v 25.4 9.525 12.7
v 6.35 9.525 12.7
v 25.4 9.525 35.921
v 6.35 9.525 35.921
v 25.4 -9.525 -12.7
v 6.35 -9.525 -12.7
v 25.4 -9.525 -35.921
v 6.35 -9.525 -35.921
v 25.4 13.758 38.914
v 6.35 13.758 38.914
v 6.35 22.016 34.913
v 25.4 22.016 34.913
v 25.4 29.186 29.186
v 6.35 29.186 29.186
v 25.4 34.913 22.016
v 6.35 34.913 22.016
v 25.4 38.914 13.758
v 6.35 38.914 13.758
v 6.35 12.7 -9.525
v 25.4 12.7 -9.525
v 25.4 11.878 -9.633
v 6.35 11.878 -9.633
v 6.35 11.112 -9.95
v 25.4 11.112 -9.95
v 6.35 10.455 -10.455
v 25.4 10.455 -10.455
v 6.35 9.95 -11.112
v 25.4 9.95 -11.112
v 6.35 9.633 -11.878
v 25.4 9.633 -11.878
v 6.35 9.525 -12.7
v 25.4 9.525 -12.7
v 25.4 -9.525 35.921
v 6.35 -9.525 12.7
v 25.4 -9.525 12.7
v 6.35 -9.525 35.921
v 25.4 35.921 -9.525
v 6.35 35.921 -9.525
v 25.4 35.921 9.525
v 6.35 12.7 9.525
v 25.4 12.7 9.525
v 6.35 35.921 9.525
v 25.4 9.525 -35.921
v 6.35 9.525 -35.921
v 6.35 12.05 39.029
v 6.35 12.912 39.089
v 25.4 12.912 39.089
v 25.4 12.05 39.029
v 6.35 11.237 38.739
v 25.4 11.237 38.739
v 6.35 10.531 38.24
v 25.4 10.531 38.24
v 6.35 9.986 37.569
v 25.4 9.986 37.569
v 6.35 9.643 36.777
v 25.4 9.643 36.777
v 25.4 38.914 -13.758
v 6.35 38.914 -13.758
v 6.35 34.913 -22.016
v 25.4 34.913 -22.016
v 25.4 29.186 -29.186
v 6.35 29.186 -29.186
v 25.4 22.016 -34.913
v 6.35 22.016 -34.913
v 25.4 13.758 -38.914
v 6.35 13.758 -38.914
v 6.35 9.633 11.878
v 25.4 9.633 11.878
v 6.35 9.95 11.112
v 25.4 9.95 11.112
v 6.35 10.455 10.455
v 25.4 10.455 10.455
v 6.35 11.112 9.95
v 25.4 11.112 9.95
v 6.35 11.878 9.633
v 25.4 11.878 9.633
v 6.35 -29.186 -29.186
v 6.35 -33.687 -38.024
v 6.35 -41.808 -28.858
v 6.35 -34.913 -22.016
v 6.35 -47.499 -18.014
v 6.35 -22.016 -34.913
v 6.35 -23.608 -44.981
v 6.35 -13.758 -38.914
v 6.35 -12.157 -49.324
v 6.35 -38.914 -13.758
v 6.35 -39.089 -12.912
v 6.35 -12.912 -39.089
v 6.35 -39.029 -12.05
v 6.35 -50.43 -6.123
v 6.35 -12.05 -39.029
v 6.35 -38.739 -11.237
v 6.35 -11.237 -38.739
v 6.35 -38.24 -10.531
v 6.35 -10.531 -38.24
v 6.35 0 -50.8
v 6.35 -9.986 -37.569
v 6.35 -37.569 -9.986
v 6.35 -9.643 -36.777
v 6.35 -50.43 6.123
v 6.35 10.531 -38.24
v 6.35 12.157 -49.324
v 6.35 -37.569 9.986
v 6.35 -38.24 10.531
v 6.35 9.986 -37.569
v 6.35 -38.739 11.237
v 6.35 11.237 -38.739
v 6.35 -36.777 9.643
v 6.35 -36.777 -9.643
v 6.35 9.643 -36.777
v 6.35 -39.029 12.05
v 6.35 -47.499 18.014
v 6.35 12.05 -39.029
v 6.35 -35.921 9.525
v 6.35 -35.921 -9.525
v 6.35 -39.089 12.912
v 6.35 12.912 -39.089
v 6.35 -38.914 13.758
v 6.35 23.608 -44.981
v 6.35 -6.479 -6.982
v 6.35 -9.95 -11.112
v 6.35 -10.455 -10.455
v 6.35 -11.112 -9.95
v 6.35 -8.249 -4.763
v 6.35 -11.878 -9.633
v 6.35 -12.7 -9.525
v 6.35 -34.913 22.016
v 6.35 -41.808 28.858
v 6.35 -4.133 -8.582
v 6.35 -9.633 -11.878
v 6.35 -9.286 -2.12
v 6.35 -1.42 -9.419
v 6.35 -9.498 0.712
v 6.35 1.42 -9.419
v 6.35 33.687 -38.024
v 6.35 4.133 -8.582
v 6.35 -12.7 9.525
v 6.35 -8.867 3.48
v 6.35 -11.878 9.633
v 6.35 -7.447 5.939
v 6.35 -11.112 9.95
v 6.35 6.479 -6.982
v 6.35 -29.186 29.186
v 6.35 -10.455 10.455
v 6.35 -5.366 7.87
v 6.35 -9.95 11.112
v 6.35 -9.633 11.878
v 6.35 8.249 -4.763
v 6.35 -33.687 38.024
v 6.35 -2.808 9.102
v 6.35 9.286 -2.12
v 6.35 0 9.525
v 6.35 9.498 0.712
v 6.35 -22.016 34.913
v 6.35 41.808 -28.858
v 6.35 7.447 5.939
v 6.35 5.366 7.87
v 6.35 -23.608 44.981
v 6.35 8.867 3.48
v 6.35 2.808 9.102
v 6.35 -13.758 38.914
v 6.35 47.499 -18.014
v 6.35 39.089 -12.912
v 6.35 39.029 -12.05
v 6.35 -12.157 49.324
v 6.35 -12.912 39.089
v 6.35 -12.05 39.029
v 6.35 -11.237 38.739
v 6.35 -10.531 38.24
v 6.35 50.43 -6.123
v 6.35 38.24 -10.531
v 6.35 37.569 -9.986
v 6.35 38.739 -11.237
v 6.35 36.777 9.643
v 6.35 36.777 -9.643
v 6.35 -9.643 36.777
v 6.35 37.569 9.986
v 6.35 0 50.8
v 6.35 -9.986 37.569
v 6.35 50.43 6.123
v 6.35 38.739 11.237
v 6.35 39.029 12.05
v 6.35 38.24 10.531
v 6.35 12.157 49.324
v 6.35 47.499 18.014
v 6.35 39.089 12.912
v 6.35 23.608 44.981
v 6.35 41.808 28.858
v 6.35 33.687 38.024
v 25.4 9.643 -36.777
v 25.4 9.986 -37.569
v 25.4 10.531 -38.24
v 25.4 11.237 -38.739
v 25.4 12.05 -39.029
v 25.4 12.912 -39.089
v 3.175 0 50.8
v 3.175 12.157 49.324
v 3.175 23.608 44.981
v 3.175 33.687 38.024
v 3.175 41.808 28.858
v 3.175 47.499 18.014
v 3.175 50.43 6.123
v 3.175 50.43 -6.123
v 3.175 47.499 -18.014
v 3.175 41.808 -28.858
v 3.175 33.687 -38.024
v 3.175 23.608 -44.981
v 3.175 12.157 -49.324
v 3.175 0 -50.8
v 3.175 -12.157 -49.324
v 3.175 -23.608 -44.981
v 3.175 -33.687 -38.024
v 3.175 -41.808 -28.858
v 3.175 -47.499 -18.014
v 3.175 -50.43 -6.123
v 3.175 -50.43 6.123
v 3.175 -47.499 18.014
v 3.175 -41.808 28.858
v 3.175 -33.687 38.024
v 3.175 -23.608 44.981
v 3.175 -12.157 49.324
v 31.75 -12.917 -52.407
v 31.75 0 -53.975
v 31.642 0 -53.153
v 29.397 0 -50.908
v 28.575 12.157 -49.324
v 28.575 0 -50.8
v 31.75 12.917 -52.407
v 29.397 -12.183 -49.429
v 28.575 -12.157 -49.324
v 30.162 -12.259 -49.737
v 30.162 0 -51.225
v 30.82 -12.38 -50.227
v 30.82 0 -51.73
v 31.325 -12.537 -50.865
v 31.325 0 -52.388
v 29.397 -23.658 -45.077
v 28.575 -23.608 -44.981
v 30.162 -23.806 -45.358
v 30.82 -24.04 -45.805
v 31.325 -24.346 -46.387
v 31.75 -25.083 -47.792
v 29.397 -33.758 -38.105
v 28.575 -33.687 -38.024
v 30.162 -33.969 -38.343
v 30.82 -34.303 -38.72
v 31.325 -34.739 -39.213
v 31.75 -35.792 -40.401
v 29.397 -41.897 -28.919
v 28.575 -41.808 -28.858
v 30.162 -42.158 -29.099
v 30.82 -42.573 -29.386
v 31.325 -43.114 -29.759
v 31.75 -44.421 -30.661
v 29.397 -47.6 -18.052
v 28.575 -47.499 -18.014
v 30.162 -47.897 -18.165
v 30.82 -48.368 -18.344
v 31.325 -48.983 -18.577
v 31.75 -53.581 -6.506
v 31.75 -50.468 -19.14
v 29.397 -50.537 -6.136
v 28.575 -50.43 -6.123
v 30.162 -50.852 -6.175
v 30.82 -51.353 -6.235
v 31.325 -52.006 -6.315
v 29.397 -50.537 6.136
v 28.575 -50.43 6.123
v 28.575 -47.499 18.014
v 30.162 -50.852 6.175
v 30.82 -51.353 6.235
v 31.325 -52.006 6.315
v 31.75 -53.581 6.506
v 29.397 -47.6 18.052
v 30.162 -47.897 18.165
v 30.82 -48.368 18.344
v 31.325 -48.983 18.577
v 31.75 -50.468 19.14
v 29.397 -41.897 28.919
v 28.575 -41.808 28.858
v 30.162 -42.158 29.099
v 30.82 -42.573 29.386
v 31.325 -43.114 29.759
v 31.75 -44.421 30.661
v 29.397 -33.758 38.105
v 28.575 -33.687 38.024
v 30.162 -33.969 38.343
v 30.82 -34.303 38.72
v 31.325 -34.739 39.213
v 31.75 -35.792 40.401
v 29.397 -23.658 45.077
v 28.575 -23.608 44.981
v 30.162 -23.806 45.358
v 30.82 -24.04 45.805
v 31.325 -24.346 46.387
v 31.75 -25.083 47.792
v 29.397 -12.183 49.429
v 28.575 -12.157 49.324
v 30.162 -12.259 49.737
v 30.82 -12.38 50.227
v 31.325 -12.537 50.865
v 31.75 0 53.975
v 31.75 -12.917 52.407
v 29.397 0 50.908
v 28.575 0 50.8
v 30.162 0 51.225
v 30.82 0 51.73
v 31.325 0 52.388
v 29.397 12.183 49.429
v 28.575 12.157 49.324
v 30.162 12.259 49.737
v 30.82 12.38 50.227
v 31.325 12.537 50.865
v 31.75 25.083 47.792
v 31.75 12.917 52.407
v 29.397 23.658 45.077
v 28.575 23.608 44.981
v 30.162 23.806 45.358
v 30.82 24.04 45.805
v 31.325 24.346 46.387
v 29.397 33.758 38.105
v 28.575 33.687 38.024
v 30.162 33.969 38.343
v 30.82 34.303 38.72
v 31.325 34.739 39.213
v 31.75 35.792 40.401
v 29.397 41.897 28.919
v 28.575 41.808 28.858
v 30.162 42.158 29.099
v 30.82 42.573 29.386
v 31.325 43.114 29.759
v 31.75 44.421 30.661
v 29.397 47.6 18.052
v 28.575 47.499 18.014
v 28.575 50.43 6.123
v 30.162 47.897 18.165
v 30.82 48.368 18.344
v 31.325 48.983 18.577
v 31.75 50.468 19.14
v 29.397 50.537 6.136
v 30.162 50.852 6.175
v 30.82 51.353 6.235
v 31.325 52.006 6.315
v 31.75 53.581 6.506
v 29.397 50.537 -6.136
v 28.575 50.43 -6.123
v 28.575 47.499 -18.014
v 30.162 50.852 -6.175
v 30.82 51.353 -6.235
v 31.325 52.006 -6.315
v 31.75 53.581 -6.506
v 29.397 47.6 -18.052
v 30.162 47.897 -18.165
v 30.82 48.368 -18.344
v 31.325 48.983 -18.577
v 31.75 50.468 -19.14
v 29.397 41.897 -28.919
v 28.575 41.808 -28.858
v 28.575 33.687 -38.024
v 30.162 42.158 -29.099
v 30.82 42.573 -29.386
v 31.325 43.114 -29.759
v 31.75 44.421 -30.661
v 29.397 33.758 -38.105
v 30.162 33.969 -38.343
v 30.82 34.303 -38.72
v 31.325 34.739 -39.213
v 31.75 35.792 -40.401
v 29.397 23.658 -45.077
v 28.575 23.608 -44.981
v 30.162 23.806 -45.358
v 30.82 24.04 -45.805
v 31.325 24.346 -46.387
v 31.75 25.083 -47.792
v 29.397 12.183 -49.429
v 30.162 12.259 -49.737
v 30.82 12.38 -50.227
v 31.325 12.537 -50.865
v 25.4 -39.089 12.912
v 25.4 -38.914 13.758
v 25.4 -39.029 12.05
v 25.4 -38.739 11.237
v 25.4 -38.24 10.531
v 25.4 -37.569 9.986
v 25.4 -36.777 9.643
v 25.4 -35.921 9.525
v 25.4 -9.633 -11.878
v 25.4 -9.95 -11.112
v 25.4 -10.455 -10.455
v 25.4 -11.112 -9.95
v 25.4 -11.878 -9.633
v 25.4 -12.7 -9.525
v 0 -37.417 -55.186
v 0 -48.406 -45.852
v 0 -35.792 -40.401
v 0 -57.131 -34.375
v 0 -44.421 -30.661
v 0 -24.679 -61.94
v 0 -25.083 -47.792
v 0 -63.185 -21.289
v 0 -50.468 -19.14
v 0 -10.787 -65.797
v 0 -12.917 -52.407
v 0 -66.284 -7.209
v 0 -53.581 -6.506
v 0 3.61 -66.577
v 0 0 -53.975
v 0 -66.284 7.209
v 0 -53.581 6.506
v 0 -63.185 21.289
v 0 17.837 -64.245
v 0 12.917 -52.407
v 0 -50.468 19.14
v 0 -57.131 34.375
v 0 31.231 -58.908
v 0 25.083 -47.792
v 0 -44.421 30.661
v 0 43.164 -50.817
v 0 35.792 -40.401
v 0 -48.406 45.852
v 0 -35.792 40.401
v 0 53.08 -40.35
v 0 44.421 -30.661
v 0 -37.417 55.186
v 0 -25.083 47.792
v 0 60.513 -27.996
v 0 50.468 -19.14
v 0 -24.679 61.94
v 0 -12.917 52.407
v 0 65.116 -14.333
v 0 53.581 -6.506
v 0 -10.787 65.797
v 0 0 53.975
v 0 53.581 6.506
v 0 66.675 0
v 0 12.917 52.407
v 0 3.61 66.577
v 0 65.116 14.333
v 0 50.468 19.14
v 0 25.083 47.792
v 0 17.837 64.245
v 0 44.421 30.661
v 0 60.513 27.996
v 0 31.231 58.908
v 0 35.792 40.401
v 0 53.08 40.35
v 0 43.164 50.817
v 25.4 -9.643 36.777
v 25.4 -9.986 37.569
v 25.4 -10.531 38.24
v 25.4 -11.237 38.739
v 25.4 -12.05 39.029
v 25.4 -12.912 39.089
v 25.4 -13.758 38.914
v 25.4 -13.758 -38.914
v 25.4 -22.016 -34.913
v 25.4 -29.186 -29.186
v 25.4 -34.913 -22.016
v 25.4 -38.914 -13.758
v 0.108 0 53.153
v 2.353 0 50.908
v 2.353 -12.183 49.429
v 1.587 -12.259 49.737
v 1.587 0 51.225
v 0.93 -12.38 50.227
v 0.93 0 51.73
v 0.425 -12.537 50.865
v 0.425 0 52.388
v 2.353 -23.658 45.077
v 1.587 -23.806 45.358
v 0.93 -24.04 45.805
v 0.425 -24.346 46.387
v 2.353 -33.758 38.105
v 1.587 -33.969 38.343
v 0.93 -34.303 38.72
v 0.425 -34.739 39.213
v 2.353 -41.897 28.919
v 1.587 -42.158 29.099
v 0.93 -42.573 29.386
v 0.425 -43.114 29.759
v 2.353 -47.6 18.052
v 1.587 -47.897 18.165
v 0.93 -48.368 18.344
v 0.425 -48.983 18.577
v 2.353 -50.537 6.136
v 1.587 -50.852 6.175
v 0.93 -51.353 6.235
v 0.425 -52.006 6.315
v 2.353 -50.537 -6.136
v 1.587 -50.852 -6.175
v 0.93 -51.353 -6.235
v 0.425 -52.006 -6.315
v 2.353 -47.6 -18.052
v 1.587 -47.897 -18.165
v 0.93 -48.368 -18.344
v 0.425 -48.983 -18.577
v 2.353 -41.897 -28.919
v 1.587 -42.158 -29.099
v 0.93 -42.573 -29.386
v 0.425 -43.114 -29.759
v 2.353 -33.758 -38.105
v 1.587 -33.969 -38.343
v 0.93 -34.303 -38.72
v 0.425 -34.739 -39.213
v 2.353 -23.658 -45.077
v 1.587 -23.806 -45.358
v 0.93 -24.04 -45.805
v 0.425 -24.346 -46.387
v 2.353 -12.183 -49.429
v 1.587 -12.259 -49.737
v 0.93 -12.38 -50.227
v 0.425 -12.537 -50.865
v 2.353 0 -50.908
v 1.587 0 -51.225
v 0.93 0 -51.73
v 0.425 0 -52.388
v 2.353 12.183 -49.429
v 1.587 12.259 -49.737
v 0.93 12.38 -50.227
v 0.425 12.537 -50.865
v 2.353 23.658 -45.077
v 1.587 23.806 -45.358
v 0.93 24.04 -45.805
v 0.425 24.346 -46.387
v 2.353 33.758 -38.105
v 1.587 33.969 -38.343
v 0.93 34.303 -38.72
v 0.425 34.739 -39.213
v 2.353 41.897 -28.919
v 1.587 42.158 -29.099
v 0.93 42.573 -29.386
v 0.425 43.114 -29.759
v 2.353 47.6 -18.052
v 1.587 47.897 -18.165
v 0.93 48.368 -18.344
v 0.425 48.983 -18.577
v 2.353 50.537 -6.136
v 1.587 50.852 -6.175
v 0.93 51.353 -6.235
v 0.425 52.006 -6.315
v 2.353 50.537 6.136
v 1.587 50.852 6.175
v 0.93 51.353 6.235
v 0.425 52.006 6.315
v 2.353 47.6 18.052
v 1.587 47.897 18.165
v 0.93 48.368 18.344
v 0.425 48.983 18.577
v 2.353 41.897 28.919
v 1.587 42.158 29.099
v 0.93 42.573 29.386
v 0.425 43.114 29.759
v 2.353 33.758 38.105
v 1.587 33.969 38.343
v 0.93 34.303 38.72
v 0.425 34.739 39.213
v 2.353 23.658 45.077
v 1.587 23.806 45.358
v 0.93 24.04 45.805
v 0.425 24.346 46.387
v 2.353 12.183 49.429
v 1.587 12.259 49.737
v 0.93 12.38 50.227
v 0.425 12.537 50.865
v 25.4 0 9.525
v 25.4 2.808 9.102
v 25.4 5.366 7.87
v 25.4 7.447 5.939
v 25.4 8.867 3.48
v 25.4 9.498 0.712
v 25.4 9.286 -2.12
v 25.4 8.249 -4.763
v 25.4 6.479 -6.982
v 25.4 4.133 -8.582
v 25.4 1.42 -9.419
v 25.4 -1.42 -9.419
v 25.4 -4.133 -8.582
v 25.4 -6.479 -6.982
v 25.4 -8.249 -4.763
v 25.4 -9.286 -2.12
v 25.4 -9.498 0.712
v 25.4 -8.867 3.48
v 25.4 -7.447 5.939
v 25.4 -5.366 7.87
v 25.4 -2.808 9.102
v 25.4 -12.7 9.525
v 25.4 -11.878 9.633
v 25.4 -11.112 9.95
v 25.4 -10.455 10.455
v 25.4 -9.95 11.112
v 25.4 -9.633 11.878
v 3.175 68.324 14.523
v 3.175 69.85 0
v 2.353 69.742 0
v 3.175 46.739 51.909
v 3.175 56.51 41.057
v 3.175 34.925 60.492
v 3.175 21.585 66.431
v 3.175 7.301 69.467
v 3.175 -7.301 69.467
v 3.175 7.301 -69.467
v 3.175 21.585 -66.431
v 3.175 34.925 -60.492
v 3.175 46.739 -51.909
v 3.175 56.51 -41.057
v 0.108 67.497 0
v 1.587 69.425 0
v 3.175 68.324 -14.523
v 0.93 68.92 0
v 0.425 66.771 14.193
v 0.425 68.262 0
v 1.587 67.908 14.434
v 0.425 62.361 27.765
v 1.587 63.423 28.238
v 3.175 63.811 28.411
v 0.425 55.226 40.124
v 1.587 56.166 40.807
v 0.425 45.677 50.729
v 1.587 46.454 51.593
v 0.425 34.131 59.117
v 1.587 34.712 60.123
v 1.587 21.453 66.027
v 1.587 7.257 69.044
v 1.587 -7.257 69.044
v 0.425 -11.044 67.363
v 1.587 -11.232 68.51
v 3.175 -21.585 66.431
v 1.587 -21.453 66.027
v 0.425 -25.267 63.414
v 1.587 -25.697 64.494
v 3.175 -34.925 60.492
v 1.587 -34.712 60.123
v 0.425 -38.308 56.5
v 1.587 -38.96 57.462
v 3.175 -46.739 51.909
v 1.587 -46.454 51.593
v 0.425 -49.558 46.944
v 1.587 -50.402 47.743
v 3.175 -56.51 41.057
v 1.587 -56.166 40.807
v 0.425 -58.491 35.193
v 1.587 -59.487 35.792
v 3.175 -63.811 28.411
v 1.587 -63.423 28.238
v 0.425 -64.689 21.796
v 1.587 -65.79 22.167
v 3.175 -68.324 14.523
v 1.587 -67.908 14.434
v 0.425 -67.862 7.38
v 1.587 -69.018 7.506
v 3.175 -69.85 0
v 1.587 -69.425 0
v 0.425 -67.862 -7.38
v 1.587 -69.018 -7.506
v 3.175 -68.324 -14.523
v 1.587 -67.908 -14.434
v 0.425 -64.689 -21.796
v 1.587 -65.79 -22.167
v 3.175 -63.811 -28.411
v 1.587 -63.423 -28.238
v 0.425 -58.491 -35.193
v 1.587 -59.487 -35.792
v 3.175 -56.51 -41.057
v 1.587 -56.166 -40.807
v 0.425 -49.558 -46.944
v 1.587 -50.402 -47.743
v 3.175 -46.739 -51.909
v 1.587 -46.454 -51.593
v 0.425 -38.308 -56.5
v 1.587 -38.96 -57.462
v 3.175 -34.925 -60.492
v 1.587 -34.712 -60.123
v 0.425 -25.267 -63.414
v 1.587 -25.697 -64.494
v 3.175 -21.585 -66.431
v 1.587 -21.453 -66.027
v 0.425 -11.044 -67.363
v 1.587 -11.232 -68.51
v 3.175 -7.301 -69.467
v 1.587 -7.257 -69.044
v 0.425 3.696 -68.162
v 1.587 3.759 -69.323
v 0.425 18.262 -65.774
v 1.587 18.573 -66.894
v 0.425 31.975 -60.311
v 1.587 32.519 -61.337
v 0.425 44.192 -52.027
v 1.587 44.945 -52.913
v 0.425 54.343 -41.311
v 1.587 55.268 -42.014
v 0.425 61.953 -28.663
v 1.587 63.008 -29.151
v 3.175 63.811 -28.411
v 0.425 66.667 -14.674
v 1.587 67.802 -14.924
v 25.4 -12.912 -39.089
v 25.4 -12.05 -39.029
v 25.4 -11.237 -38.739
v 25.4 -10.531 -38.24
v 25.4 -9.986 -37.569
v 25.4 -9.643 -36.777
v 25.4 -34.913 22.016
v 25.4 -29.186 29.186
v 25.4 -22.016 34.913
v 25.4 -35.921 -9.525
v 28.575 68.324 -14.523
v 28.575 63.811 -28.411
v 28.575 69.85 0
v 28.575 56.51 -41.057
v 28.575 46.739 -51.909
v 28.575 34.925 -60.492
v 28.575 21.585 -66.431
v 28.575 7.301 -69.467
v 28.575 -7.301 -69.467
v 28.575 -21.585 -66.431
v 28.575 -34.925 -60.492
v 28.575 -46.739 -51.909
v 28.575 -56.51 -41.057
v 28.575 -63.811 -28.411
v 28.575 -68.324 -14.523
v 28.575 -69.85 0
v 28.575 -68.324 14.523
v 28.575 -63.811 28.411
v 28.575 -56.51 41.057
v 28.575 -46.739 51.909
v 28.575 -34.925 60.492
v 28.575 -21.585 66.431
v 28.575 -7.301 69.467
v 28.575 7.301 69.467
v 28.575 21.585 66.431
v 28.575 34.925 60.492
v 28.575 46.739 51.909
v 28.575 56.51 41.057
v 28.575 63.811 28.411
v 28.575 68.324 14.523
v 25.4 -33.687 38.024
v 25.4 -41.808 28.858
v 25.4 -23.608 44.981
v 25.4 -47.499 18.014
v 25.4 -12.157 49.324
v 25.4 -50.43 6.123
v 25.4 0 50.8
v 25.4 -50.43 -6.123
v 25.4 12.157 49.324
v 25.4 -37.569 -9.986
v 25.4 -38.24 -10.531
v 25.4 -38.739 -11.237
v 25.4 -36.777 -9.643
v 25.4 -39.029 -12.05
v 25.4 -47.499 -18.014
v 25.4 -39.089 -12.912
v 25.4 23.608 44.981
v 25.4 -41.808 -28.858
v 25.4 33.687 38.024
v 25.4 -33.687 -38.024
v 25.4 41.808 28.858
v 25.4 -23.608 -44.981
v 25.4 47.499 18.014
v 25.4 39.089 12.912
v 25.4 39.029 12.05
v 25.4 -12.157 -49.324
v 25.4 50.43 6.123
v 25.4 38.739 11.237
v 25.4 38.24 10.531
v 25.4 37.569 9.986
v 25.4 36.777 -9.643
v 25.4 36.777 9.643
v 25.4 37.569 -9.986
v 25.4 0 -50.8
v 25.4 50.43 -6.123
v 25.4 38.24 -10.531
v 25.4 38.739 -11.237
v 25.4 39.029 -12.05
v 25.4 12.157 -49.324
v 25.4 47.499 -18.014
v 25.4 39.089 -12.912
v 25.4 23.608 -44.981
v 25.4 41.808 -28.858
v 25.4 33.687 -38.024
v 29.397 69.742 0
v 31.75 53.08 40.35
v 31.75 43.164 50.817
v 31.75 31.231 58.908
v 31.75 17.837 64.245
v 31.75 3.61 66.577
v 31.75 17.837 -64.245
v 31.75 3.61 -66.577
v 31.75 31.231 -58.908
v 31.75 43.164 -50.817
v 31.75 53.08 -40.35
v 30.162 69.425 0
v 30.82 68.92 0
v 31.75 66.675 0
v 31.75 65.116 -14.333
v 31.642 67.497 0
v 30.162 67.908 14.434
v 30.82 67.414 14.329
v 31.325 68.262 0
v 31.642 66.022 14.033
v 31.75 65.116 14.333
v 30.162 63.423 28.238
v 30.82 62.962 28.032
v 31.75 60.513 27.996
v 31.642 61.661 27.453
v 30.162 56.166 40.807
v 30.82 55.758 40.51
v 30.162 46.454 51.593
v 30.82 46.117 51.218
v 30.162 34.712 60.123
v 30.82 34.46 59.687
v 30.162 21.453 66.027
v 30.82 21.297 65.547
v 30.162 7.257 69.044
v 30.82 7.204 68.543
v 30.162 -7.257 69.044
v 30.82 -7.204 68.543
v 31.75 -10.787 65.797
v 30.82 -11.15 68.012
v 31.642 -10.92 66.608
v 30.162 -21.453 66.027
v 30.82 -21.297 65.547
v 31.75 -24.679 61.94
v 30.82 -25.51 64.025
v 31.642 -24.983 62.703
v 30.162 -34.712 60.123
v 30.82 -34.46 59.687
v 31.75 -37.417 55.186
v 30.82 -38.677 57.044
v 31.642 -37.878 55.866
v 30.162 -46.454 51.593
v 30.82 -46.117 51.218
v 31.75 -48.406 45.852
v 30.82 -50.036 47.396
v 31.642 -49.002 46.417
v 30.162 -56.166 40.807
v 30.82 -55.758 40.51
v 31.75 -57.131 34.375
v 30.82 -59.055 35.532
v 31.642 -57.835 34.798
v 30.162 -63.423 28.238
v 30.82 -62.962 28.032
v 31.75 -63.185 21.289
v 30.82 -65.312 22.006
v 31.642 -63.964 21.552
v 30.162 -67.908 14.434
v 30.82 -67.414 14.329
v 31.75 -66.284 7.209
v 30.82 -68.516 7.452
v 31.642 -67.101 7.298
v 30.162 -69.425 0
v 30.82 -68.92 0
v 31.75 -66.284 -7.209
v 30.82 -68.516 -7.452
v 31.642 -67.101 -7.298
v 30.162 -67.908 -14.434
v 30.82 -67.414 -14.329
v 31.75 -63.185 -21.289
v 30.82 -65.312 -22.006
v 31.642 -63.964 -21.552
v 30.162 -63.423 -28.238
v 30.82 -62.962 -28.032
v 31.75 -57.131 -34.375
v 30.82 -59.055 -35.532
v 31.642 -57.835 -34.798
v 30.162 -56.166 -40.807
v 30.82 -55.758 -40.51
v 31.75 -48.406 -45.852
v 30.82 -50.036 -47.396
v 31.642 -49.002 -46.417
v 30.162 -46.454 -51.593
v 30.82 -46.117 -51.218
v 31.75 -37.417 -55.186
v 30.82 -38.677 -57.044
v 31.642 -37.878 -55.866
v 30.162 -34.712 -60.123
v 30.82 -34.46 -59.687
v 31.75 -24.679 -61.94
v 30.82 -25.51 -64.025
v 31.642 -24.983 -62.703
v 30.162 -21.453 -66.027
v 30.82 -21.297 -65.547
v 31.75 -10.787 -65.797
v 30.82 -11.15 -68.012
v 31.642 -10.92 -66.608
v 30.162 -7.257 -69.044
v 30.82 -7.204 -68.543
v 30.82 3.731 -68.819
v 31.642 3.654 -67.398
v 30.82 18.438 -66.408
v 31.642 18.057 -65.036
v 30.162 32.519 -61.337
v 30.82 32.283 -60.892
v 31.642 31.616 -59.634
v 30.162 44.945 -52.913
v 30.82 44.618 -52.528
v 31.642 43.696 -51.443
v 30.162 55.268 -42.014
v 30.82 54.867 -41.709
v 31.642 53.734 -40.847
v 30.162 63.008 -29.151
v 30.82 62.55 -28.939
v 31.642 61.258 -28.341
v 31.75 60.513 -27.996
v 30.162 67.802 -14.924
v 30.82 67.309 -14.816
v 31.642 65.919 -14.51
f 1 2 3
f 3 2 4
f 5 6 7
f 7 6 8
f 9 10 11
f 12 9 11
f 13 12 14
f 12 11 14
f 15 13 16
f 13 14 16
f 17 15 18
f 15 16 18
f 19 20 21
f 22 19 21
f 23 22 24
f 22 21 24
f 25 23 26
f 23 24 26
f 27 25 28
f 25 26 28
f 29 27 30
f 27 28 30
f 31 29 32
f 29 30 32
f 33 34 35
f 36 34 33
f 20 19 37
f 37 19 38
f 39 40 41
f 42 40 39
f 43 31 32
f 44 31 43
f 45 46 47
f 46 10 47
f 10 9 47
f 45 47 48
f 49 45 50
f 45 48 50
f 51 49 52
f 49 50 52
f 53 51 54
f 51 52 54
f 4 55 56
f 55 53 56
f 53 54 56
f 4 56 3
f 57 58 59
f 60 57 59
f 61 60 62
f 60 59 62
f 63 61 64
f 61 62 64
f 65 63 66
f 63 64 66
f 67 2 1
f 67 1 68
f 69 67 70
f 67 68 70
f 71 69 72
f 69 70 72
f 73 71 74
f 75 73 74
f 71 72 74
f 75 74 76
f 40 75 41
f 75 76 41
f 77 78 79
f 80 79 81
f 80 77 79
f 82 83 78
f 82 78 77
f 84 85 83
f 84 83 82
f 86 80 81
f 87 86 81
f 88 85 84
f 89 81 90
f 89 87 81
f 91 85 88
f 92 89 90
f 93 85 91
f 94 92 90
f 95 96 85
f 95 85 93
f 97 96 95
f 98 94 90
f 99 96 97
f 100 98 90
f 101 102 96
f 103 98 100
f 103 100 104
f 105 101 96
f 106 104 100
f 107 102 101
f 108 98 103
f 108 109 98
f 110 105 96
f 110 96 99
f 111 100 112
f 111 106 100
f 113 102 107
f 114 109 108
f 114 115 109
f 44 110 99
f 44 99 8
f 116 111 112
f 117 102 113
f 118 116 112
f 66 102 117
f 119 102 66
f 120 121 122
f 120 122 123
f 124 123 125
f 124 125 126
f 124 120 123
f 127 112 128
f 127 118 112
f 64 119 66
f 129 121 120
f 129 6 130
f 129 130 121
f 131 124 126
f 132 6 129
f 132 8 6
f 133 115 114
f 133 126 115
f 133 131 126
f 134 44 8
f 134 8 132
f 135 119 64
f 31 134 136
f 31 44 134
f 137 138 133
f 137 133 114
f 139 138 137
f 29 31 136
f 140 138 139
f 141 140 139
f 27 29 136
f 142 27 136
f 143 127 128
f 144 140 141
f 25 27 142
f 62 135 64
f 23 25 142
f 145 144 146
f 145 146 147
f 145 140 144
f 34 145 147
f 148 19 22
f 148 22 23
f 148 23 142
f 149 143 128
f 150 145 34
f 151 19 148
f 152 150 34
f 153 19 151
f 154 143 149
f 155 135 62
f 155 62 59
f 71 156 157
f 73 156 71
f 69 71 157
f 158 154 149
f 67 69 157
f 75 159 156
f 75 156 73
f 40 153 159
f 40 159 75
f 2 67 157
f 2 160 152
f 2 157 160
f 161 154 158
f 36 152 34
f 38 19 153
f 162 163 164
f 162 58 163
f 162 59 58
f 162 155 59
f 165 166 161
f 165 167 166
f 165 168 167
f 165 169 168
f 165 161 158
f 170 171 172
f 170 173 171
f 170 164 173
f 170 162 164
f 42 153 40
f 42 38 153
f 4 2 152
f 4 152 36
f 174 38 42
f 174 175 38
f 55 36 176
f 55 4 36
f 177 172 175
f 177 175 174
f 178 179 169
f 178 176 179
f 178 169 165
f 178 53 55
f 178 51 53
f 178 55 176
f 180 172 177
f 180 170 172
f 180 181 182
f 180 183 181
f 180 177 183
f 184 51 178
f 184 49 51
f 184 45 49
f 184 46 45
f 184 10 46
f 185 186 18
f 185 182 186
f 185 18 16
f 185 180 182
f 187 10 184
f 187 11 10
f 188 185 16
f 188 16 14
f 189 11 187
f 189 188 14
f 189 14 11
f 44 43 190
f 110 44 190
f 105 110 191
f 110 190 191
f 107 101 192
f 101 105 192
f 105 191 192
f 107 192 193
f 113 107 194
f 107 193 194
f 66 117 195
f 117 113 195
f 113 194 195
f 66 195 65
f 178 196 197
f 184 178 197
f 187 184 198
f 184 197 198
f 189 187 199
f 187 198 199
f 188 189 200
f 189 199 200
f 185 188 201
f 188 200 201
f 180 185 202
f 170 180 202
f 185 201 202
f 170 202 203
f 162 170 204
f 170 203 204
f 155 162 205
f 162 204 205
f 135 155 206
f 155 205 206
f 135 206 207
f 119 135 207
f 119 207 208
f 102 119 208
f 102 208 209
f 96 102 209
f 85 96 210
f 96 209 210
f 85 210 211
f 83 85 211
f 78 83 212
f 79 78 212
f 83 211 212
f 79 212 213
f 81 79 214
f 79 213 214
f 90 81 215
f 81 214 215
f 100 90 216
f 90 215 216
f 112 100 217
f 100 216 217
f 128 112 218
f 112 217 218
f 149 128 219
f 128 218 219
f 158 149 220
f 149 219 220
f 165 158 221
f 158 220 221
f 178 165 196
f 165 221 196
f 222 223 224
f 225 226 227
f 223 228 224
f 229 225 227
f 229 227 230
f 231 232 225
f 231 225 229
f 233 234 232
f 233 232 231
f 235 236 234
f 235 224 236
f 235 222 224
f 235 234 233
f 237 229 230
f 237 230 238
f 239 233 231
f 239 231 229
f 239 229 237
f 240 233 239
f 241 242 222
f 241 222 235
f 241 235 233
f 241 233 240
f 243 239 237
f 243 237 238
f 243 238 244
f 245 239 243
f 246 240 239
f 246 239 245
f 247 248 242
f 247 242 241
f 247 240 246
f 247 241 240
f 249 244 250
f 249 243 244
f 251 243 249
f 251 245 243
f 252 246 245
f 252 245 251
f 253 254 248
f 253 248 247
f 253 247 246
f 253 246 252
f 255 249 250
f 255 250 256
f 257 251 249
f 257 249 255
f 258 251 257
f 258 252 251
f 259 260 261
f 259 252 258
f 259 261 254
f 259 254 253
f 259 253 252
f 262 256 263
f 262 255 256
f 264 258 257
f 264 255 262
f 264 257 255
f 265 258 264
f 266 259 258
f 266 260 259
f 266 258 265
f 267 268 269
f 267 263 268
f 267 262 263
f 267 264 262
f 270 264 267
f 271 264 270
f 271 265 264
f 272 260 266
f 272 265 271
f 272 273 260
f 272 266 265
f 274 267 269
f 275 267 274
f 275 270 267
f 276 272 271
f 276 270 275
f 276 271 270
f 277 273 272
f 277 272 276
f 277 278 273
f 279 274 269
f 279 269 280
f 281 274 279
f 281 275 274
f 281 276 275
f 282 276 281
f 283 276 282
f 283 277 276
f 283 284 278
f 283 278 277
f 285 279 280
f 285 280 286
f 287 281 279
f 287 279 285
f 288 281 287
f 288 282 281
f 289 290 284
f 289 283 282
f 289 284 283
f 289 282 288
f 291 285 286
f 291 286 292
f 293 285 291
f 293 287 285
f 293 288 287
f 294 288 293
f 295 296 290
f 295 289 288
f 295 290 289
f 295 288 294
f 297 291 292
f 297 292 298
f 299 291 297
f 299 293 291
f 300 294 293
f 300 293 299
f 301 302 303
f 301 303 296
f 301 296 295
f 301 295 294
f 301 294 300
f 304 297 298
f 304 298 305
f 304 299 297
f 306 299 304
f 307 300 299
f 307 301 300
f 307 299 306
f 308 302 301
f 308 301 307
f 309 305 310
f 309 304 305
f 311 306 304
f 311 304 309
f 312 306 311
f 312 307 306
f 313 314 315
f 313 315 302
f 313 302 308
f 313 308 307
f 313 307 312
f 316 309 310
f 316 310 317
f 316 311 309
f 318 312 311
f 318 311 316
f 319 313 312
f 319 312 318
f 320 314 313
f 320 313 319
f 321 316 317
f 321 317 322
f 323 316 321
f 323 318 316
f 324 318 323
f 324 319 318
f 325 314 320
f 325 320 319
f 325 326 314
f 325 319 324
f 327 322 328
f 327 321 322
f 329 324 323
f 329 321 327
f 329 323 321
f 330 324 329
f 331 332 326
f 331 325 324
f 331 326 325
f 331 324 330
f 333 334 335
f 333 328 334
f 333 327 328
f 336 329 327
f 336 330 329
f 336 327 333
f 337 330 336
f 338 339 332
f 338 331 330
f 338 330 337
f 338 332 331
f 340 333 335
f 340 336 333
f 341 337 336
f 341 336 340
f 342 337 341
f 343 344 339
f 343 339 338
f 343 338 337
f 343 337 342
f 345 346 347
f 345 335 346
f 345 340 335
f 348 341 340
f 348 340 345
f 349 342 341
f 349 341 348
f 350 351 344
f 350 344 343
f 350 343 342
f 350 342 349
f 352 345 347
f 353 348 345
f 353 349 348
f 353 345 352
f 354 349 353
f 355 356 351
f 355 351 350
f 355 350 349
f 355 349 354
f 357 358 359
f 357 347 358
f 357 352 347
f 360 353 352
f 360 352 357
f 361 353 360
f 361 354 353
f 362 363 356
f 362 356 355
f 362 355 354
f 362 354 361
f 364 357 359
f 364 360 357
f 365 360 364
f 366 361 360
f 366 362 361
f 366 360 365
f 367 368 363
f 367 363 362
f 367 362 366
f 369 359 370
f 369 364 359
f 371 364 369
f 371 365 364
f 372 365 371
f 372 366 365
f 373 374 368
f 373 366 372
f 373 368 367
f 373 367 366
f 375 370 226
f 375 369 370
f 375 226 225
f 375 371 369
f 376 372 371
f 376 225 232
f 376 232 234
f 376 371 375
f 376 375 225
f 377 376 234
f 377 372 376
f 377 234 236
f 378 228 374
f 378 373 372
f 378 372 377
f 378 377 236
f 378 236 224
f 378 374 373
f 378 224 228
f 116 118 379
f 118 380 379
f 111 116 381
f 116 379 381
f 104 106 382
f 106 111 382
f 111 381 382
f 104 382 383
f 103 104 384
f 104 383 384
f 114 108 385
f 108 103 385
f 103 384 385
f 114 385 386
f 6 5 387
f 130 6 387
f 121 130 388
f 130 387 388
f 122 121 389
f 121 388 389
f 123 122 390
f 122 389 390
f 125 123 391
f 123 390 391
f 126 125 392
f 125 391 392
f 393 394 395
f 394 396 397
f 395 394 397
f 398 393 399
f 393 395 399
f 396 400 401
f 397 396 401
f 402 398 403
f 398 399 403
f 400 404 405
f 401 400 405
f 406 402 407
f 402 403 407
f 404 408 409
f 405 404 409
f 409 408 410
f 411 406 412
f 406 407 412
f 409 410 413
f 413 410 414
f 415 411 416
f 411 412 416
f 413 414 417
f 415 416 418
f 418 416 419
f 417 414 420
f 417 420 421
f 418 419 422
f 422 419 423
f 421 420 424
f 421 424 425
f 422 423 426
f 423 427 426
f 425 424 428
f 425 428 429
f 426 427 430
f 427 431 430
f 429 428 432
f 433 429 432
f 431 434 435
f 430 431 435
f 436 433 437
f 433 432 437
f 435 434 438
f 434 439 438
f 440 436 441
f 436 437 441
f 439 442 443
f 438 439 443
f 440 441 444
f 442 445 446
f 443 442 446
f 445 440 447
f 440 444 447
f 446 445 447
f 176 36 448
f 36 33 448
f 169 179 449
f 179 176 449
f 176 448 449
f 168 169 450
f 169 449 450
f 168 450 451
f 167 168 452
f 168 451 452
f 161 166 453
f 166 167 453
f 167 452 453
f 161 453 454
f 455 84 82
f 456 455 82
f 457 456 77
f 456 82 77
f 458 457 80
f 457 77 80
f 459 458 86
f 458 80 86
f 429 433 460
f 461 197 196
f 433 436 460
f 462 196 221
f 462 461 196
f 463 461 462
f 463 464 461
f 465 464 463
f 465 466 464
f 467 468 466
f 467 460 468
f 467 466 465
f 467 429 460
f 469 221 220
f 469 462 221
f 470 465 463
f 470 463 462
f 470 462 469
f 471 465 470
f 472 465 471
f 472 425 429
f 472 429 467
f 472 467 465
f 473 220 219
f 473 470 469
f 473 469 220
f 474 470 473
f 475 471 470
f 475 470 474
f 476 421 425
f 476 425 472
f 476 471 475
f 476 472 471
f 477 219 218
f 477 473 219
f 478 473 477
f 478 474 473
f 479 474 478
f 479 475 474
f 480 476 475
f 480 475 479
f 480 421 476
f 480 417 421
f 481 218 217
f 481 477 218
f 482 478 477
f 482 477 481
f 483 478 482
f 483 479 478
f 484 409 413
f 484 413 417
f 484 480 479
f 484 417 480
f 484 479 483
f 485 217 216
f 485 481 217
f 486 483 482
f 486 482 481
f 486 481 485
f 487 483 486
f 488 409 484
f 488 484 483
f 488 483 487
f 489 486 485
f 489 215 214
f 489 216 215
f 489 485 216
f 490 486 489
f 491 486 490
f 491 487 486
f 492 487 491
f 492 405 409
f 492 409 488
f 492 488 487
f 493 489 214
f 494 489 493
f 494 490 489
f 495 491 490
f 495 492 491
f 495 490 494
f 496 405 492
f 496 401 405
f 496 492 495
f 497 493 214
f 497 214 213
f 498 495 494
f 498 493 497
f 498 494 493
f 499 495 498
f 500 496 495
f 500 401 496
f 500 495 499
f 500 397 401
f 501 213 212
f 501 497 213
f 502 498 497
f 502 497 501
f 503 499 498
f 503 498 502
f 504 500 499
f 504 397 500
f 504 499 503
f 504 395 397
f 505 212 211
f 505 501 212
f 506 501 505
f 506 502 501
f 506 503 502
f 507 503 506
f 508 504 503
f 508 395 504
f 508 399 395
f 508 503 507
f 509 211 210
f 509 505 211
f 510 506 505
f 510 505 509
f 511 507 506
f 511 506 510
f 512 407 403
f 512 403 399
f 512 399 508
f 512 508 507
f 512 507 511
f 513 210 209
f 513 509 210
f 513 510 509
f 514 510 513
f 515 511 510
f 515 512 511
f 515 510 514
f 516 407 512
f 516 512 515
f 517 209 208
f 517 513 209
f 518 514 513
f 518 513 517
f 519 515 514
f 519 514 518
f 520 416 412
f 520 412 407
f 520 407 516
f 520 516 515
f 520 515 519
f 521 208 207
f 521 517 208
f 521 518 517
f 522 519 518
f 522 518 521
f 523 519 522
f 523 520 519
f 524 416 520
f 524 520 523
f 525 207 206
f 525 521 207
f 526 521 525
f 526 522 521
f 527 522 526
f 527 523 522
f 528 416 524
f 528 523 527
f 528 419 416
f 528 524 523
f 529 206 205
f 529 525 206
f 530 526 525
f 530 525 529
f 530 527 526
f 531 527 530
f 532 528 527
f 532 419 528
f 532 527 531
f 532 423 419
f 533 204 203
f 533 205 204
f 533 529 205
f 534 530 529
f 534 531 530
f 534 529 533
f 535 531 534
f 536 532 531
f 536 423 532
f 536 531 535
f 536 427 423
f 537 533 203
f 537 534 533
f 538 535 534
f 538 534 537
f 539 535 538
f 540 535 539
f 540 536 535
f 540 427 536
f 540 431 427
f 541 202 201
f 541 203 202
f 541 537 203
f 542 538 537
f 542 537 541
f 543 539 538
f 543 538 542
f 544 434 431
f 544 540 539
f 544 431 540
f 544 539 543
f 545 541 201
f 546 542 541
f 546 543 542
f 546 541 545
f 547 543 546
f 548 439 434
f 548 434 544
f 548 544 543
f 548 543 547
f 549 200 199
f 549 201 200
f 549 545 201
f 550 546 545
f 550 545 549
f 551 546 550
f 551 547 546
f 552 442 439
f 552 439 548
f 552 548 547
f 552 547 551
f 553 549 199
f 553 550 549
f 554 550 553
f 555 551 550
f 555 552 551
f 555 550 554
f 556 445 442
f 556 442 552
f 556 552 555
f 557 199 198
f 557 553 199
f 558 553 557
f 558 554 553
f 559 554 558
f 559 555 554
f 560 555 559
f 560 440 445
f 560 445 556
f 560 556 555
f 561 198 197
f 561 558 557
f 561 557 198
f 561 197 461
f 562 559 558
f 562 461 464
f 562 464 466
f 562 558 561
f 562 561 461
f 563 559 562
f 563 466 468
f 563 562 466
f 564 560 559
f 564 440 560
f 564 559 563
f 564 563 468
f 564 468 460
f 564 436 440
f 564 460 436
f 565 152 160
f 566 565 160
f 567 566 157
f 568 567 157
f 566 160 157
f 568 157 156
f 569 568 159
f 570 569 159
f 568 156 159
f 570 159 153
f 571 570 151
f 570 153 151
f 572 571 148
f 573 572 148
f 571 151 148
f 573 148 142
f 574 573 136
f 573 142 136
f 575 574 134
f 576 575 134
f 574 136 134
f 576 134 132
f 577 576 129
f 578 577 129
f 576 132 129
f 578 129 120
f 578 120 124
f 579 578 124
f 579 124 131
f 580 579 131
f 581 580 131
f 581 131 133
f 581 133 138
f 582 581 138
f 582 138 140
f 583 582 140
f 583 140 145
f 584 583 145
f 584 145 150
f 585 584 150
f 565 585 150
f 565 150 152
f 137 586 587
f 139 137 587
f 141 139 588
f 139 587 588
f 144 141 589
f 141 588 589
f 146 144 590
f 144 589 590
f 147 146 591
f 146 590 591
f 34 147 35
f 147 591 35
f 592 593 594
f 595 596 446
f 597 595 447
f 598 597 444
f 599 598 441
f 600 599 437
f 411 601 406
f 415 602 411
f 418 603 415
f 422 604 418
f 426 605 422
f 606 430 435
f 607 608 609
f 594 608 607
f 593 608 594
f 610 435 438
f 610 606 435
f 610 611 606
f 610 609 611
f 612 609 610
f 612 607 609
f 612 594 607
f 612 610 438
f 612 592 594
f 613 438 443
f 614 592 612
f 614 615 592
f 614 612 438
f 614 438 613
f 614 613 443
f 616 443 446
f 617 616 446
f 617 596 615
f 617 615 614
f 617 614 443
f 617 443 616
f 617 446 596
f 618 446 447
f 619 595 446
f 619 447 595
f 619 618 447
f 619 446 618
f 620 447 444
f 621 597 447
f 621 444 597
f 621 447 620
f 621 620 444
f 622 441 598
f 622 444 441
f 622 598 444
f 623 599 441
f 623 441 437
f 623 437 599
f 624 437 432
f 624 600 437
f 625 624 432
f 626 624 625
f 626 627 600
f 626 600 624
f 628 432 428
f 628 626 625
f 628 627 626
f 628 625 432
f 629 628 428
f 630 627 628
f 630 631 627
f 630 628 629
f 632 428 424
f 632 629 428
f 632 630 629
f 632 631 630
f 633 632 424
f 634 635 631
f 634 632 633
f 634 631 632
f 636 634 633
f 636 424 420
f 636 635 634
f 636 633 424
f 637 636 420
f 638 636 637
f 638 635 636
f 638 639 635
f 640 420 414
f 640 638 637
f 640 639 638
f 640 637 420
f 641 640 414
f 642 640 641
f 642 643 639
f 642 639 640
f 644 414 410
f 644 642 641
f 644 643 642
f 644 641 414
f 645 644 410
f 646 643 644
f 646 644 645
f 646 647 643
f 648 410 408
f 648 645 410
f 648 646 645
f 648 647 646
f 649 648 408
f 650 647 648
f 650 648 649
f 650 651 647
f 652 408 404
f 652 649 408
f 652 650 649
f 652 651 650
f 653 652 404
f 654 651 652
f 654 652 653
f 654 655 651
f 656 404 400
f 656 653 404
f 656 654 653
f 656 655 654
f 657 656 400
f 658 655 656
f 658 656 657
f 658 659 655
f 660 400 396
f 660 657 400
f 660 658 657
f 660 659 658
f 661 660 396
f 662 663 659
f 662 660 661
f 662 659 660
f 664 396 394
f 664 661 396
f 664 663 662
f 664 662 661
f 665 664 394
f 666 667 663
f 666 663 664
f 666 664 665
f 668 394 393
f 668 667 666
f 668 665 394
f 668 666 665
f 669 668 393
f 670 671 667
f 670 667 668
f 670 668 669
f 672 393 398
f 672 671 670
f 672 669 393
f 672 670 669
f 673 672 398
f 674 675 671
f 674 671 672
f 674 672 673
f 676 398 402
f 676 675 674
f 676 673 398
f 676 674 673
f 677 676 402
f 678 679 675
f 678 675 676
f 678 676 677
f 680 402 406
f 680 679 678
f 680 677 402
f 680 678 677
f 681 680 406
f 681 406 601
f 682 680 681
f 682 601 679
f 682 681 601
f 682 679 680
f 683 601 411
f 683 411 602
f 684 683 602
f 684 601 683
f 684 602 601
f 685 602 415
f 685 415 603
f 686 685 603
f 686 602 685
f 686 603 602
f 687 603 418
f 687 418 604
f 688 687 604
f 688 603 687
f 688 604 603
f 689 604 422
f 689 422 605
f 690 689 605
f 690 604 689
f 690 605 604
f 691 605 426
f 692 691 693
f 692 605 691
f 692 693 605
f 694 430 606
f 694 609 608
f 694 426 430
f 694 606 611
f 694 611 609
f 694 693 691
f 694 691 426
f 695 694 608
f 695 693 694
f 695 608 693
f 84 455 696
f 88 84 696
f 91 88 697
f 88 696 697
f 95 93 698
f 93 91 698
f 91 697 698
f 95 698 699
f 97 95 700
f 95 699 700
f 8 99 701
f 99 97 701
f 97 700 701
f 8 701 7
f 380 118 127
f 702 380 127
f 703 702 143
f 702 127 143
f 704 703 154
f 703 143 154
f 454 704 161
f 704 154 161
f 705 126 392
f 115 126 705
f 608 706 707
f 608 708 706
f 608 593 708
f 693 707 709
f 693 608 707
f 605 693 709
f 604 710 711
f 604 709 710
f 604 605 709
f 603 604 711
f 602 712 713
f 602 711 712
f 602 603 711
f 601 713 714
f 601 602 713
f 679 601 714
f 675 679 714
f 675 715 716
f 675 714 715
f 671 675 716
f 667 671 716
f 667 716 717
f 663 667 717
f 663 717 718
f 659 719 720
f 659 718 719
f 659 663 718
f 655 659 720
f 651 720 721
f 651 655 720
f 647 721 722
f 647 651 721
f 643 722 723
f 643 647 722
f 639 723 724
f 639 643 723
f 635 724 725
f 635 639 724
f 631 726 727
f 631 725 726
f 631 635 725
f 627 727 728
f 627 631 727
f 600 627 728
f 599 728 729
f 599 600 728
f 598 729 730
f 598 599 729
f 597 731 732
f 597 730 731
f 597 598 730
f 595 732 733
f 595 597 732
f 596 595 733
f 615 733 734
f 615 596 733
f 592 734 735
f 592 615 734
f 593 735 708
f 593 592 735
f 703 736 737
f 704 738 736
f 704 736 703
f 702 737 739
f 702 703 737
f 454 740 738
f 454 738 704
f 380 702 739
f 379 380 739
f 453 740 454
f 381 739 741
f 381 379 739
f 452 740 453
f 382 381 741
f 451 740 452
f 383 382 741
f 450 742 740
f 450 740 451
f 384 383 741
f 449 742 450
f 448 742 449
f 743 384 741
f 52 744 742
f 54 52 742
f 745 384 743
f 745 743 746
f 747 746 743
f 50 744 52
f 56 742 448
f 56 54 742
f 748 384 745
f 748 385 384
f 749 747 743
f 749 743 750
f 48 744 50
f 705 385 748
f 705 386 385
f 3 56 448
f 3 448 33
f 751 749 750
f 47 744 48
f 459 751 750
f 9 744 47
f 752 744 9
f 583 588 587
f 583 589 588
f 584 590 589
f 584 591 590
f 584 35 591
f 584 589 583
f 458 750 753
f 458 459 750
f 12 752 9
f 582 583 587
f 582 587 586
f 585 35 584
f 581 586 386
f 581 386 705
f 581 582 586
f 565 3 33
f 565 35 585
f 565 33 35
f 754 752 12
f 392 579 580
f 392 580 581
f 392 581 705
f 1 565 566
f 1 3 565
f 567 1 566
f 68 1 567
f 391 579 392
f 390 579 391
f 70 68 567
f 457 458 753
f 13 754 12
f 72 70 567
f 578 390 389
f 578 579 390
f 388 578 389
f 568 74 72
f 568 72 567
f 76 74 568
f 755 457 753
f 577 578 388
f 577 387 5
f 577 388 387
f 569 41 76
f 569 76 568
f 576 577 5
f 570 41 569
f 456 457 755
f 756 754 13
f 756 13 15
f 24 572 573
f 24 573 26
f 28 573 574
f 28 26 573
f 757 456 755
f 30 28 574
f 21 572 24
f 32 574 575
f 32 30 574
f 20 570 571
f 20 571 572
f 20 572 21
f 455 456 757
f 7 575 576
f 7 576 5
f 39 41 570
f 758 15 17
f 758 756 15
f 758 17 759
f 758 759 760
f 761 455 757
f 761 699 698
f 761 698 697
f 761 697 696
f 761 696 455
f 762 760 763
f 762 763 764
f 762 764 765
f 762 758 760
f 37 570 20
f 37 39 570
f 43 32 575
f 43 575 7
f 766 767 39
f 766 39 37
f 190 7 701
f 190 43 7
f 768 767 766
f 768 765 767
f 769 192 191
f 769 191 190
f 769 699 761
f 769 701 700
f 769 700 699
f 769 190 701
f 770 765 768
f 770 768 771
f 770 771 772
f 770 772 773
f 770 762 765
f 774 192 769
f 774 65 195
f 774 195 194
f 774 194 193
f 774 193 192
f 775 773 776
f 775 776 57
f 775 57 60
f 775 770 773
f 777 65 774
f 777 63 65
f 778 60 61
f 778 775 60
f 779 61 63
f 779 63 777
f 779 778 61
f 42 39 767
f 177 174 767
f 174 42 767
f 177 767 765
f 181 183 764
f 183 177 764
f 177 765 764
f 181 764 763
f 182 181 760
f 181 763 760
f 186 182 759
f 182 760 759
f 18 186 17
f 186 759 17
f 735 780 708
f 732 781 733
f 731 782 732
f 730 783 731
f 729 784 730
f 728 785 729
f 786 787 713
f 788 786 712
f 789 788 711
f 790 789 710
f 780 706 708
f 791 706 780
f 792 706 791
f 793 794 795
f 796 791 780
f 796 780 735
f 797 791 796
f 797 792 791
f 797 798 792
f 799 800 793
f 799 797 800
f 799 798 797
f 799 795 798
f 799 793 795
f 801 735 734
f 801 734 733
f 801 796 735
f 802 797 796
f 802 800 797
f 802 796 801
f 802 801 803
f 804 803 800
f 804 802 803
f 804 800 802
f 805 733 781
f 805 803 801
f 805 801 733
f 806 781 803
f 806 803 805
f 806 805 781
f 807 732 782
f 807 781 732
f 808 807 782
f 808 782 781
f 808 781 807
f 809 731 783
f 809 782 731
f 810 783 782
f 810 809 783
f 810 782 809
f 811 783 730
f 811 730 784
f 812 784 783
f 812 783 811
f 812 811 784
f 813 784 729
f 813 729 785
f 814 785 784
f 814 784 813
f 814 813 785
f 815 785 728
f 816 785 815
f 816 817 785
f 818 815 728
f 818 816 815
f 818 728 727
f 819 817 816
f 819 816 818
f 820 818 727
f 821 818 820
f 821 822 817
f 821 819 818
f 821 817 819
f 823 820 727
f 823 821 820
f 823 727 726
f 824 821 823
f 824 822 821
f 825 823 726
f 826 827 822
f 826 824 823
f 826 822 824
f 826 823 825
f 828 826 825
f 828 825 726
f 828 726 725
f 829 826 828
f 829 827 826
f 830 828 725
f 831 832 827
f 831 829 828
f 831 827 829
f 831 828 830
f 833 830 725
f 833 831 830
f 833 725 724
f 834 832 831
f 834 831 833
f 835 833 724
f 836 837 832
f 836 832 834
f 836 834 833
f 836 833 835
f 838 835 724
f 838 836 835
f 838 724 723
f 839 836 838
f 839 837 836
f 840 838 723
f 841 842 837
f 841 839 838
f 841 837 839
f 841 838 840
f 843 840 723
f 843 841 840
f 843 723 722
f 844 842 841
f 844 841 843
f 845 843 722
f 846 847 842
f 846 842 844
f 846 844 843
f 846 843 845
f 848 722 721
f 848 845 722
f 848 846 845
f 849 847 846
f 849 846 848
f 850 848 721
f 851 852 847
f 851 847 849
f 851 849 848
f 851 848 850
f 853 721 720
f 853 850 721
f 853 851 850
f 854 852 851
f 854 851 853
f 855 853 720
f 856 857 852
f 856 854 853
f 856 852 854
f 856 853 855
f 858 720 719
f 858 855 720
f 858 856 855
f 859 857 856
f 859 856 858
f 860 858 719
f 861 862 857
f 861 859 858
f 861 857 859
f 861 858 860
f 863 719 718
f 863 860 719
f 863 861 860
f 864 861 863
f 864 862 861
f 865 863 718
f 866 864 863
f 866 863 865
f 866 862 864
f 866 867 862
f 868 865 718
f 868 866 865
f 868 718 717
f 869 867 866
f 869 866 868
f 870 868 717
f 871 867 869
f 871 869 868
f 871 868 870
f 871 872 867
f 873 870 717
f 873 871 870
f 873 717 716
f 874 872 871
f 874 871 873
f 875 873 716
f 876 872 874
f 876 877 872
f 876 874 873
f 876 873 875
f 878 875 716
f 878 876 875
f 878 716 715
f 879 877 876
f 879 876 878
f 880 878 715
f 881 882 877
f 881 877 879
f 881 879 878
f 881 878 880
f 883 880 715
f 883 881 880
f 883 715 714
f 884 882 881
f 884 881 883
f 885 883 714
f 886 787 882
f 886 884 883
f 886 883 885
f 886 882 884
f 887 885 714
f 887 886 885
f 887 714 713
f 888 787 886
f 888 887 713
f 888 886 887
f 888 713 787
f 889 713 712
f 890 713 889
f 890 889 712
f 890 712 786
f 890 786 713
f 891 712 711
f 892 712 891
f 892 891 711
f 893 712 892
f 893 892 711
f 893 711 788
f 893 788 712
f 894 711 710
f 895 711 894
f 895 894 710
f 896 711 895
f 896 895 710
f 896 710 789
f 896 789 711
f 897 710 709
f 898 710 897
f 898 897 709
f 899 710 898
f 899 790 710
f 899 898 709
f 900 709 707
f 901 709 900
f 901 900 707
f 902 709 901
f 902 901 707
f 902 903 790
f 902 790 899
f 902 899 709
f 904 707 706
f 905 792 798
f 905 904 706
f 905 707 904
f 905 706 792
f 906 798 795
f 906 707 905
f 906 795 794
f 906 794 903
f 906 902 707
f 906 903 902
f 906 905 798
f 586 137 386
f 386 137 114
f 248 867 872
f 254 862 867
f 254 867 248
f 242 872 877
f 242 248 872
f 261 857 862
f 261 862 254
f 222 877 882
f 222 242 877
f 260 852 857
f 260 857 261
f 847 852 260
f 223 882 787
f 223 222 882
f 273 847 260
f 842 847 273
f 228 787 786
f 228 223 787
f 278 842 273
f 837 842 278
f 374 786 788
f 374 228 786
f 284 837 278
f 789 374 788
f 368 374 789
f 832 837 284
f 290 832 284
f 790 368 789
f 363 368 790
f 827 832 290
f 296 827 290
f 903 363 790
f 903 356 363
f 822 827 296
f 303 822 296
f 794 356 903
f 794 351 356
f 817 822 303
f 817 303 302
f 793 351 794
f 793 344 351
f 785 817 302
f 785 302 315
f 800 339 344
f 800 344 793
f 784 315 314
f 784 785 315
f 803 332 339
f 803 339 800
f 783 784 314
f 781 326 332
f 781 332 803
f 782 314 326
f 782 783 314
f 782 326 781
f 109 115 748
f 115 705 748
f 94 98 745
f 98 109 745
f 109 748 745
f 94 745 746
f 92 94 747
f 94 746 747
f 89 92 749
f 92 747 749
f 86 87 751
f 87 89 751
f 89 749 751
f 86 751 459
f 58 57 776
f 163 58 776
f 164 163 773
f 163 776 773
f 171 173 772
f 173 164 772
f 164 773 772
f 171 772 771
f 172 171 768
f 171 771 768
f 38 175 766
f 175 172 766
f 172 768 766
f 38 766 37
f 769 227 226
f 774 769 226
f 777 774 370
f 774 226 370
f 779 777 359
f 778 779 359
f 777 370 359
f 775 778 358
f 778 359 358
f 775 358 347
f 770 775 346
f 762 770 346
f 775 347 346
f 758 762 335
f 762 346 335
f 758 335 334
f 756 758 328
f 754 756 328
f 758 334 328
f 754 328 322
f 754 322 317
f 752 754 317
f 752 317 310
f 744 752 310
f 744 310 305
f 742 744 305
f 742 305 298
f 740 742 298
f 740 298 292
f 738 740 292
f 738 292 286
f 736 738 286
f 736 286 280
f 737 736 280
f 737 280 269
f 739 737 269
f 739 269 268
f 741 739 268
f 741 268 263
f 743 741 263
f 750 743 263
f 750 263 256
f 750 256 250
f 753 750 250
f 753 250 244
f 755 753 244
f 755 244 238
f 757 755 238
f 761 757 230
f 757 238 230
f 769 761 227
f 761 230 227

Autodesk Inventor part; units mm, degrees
ref_plane "YZ Plane" through (0, 0, 0) normal (1, 0, 0) x (0, 1, 0)
ref_plane "XZ Plane" through (0, 0, 0) normal (0, 1, 0) x (-1, 0, 0)
ref_plane "XY Plane" through (0, 0, 0) normal (0, 0, 1) x (1, 0, 0)
sketch "Sketch1" plane through (0, 0, 0) normal (1, 0, 0) x (0, 1, 0)
  point P0 (0, 0)
sketch "Sketch2" plane through (0, 0, 0) normal (1, 0, 0) x (0, 1, 0)
  circle A0 centre (0, 0) radius 69.85
  dimension "d0" = 139.7
extrude "Extrusion1" add sketch "Sketch2" along normal blind 31.75
sketch "Sketch3" plane through (0, 0, 0) normal (-1, 0, 0) x (0, 0, 1)
  circle A0 centre (0, 0) radius 50.8
  dimension "d3" = 101.6
extrude "Extrusion2" cut sketch "Sketch3" against normal blind 6.35
sketch "Sketch4" plane through (31.75, 0, 0) normal (1, 0, 0) x (0, 0, -1)
  circle A0 centre (0, 0) radius 50.8
  dimension "d6" = 101.6
extrude "Extrusion3" cut sketch "Sketch4" against normal blind 6.35
sketch "Sketch5" plane through (6.35, 0, 0) normal (-1, 0, 0) x (0, 0, 1)
  circle A0 centre (0, 0) radius 9.525
  line L0 (9.525, 0) -> (9.525, 40.1609)
  circle A1 centre (0, 0) radius 50.8 projected
  line L1 (9.525, -9.525) -> (9.525, -40.1609)
  line L2 (-9.525, 9.525) -> (-40.1609, 9.525)
  line L3 (9.525, 9.525) -> (40.1609, 9.525)
  line L4 (-9.525, 9.525) -> (-9.525, 40.1609)
  line L5 (-9.525, -9.525) -> (-9.525, -40.1609)
  line L6 (-9.525, -9.525) -> (-40.1609, -9.525)
  line L7 (9.525, -9.525) -> (40.1609, -9.525)
  arc A2 (9.525, -40.1609) -> (40.1609, -9.525) centre (0, 0) ccw
  arc A3 (40.1609, 9.525) -> (9.525, 40.1609) centre (0, 0) ccw
  arc A4 (-9.525, 40.1609) -> (-40.1609, 9.525) centre (0, 0) ccw
  arc A5 (-40.1609, -9.525) -> (-9.525, -40.1609) centre (0, 0) ccw
sketch "Sketch6" plane through (6.35, 0, 0) normal (-1, 0, 0) x (0, 0, 1)
  point P0 (0, 0)
sketch "Sketch7" plane through (6.35, 0, 0) normal (-1, 0, 0) x (0, 0, 1)
  point P0 (0, 0)
extrude "Extrusion4" cut sketch "Sketch5" against normal through all contours A0 | L0 A3 L3 | L7 A2 L1 | L2 A4 L4 | L5 A5 L6
fillet "Fillet1" radius 3.175 12 edges at (15.875, 9.525, -9.525) (15.875, 9.525, 9.525) (15.875, -9.525, 9.525) (15.875, 40.1609, 9.525) (15.875, 9.525, 40.1609) (15.875, -40.1609, 9.525) (15.875, 9.525, -40.1609) (15.875, -9.525, -9.525) (15.875, -9.525, -40.1609) (15.875, -40.1609, -9.525) (15.875, -9.525, 40.1609) (15.875, 40.1609, -9.525)
fillet "Fillet2" radius 3.175 4 edges at (0, -69.85, 0) (0, 0, -50.8) (31.75, -69.85, 0) (31.75, 0, 50.8)
sketch "Sketch8" plane through (31.75, 0, 0) normal (1, 0, 0) x (0, 0, -1)
  point P0 (0, 0)
sketch "Sketch9" plane through (0, 0, 0) normal (0, 1, 0) x (-1, 0, 0)
  point P0 (0, 0)
sketch "Sketch10" plane through (25.4, 0, 0) normal (1, 0, 0) x (0, 0, -1)
  point P0 (0, 0)
properties part number "cock wheel"
